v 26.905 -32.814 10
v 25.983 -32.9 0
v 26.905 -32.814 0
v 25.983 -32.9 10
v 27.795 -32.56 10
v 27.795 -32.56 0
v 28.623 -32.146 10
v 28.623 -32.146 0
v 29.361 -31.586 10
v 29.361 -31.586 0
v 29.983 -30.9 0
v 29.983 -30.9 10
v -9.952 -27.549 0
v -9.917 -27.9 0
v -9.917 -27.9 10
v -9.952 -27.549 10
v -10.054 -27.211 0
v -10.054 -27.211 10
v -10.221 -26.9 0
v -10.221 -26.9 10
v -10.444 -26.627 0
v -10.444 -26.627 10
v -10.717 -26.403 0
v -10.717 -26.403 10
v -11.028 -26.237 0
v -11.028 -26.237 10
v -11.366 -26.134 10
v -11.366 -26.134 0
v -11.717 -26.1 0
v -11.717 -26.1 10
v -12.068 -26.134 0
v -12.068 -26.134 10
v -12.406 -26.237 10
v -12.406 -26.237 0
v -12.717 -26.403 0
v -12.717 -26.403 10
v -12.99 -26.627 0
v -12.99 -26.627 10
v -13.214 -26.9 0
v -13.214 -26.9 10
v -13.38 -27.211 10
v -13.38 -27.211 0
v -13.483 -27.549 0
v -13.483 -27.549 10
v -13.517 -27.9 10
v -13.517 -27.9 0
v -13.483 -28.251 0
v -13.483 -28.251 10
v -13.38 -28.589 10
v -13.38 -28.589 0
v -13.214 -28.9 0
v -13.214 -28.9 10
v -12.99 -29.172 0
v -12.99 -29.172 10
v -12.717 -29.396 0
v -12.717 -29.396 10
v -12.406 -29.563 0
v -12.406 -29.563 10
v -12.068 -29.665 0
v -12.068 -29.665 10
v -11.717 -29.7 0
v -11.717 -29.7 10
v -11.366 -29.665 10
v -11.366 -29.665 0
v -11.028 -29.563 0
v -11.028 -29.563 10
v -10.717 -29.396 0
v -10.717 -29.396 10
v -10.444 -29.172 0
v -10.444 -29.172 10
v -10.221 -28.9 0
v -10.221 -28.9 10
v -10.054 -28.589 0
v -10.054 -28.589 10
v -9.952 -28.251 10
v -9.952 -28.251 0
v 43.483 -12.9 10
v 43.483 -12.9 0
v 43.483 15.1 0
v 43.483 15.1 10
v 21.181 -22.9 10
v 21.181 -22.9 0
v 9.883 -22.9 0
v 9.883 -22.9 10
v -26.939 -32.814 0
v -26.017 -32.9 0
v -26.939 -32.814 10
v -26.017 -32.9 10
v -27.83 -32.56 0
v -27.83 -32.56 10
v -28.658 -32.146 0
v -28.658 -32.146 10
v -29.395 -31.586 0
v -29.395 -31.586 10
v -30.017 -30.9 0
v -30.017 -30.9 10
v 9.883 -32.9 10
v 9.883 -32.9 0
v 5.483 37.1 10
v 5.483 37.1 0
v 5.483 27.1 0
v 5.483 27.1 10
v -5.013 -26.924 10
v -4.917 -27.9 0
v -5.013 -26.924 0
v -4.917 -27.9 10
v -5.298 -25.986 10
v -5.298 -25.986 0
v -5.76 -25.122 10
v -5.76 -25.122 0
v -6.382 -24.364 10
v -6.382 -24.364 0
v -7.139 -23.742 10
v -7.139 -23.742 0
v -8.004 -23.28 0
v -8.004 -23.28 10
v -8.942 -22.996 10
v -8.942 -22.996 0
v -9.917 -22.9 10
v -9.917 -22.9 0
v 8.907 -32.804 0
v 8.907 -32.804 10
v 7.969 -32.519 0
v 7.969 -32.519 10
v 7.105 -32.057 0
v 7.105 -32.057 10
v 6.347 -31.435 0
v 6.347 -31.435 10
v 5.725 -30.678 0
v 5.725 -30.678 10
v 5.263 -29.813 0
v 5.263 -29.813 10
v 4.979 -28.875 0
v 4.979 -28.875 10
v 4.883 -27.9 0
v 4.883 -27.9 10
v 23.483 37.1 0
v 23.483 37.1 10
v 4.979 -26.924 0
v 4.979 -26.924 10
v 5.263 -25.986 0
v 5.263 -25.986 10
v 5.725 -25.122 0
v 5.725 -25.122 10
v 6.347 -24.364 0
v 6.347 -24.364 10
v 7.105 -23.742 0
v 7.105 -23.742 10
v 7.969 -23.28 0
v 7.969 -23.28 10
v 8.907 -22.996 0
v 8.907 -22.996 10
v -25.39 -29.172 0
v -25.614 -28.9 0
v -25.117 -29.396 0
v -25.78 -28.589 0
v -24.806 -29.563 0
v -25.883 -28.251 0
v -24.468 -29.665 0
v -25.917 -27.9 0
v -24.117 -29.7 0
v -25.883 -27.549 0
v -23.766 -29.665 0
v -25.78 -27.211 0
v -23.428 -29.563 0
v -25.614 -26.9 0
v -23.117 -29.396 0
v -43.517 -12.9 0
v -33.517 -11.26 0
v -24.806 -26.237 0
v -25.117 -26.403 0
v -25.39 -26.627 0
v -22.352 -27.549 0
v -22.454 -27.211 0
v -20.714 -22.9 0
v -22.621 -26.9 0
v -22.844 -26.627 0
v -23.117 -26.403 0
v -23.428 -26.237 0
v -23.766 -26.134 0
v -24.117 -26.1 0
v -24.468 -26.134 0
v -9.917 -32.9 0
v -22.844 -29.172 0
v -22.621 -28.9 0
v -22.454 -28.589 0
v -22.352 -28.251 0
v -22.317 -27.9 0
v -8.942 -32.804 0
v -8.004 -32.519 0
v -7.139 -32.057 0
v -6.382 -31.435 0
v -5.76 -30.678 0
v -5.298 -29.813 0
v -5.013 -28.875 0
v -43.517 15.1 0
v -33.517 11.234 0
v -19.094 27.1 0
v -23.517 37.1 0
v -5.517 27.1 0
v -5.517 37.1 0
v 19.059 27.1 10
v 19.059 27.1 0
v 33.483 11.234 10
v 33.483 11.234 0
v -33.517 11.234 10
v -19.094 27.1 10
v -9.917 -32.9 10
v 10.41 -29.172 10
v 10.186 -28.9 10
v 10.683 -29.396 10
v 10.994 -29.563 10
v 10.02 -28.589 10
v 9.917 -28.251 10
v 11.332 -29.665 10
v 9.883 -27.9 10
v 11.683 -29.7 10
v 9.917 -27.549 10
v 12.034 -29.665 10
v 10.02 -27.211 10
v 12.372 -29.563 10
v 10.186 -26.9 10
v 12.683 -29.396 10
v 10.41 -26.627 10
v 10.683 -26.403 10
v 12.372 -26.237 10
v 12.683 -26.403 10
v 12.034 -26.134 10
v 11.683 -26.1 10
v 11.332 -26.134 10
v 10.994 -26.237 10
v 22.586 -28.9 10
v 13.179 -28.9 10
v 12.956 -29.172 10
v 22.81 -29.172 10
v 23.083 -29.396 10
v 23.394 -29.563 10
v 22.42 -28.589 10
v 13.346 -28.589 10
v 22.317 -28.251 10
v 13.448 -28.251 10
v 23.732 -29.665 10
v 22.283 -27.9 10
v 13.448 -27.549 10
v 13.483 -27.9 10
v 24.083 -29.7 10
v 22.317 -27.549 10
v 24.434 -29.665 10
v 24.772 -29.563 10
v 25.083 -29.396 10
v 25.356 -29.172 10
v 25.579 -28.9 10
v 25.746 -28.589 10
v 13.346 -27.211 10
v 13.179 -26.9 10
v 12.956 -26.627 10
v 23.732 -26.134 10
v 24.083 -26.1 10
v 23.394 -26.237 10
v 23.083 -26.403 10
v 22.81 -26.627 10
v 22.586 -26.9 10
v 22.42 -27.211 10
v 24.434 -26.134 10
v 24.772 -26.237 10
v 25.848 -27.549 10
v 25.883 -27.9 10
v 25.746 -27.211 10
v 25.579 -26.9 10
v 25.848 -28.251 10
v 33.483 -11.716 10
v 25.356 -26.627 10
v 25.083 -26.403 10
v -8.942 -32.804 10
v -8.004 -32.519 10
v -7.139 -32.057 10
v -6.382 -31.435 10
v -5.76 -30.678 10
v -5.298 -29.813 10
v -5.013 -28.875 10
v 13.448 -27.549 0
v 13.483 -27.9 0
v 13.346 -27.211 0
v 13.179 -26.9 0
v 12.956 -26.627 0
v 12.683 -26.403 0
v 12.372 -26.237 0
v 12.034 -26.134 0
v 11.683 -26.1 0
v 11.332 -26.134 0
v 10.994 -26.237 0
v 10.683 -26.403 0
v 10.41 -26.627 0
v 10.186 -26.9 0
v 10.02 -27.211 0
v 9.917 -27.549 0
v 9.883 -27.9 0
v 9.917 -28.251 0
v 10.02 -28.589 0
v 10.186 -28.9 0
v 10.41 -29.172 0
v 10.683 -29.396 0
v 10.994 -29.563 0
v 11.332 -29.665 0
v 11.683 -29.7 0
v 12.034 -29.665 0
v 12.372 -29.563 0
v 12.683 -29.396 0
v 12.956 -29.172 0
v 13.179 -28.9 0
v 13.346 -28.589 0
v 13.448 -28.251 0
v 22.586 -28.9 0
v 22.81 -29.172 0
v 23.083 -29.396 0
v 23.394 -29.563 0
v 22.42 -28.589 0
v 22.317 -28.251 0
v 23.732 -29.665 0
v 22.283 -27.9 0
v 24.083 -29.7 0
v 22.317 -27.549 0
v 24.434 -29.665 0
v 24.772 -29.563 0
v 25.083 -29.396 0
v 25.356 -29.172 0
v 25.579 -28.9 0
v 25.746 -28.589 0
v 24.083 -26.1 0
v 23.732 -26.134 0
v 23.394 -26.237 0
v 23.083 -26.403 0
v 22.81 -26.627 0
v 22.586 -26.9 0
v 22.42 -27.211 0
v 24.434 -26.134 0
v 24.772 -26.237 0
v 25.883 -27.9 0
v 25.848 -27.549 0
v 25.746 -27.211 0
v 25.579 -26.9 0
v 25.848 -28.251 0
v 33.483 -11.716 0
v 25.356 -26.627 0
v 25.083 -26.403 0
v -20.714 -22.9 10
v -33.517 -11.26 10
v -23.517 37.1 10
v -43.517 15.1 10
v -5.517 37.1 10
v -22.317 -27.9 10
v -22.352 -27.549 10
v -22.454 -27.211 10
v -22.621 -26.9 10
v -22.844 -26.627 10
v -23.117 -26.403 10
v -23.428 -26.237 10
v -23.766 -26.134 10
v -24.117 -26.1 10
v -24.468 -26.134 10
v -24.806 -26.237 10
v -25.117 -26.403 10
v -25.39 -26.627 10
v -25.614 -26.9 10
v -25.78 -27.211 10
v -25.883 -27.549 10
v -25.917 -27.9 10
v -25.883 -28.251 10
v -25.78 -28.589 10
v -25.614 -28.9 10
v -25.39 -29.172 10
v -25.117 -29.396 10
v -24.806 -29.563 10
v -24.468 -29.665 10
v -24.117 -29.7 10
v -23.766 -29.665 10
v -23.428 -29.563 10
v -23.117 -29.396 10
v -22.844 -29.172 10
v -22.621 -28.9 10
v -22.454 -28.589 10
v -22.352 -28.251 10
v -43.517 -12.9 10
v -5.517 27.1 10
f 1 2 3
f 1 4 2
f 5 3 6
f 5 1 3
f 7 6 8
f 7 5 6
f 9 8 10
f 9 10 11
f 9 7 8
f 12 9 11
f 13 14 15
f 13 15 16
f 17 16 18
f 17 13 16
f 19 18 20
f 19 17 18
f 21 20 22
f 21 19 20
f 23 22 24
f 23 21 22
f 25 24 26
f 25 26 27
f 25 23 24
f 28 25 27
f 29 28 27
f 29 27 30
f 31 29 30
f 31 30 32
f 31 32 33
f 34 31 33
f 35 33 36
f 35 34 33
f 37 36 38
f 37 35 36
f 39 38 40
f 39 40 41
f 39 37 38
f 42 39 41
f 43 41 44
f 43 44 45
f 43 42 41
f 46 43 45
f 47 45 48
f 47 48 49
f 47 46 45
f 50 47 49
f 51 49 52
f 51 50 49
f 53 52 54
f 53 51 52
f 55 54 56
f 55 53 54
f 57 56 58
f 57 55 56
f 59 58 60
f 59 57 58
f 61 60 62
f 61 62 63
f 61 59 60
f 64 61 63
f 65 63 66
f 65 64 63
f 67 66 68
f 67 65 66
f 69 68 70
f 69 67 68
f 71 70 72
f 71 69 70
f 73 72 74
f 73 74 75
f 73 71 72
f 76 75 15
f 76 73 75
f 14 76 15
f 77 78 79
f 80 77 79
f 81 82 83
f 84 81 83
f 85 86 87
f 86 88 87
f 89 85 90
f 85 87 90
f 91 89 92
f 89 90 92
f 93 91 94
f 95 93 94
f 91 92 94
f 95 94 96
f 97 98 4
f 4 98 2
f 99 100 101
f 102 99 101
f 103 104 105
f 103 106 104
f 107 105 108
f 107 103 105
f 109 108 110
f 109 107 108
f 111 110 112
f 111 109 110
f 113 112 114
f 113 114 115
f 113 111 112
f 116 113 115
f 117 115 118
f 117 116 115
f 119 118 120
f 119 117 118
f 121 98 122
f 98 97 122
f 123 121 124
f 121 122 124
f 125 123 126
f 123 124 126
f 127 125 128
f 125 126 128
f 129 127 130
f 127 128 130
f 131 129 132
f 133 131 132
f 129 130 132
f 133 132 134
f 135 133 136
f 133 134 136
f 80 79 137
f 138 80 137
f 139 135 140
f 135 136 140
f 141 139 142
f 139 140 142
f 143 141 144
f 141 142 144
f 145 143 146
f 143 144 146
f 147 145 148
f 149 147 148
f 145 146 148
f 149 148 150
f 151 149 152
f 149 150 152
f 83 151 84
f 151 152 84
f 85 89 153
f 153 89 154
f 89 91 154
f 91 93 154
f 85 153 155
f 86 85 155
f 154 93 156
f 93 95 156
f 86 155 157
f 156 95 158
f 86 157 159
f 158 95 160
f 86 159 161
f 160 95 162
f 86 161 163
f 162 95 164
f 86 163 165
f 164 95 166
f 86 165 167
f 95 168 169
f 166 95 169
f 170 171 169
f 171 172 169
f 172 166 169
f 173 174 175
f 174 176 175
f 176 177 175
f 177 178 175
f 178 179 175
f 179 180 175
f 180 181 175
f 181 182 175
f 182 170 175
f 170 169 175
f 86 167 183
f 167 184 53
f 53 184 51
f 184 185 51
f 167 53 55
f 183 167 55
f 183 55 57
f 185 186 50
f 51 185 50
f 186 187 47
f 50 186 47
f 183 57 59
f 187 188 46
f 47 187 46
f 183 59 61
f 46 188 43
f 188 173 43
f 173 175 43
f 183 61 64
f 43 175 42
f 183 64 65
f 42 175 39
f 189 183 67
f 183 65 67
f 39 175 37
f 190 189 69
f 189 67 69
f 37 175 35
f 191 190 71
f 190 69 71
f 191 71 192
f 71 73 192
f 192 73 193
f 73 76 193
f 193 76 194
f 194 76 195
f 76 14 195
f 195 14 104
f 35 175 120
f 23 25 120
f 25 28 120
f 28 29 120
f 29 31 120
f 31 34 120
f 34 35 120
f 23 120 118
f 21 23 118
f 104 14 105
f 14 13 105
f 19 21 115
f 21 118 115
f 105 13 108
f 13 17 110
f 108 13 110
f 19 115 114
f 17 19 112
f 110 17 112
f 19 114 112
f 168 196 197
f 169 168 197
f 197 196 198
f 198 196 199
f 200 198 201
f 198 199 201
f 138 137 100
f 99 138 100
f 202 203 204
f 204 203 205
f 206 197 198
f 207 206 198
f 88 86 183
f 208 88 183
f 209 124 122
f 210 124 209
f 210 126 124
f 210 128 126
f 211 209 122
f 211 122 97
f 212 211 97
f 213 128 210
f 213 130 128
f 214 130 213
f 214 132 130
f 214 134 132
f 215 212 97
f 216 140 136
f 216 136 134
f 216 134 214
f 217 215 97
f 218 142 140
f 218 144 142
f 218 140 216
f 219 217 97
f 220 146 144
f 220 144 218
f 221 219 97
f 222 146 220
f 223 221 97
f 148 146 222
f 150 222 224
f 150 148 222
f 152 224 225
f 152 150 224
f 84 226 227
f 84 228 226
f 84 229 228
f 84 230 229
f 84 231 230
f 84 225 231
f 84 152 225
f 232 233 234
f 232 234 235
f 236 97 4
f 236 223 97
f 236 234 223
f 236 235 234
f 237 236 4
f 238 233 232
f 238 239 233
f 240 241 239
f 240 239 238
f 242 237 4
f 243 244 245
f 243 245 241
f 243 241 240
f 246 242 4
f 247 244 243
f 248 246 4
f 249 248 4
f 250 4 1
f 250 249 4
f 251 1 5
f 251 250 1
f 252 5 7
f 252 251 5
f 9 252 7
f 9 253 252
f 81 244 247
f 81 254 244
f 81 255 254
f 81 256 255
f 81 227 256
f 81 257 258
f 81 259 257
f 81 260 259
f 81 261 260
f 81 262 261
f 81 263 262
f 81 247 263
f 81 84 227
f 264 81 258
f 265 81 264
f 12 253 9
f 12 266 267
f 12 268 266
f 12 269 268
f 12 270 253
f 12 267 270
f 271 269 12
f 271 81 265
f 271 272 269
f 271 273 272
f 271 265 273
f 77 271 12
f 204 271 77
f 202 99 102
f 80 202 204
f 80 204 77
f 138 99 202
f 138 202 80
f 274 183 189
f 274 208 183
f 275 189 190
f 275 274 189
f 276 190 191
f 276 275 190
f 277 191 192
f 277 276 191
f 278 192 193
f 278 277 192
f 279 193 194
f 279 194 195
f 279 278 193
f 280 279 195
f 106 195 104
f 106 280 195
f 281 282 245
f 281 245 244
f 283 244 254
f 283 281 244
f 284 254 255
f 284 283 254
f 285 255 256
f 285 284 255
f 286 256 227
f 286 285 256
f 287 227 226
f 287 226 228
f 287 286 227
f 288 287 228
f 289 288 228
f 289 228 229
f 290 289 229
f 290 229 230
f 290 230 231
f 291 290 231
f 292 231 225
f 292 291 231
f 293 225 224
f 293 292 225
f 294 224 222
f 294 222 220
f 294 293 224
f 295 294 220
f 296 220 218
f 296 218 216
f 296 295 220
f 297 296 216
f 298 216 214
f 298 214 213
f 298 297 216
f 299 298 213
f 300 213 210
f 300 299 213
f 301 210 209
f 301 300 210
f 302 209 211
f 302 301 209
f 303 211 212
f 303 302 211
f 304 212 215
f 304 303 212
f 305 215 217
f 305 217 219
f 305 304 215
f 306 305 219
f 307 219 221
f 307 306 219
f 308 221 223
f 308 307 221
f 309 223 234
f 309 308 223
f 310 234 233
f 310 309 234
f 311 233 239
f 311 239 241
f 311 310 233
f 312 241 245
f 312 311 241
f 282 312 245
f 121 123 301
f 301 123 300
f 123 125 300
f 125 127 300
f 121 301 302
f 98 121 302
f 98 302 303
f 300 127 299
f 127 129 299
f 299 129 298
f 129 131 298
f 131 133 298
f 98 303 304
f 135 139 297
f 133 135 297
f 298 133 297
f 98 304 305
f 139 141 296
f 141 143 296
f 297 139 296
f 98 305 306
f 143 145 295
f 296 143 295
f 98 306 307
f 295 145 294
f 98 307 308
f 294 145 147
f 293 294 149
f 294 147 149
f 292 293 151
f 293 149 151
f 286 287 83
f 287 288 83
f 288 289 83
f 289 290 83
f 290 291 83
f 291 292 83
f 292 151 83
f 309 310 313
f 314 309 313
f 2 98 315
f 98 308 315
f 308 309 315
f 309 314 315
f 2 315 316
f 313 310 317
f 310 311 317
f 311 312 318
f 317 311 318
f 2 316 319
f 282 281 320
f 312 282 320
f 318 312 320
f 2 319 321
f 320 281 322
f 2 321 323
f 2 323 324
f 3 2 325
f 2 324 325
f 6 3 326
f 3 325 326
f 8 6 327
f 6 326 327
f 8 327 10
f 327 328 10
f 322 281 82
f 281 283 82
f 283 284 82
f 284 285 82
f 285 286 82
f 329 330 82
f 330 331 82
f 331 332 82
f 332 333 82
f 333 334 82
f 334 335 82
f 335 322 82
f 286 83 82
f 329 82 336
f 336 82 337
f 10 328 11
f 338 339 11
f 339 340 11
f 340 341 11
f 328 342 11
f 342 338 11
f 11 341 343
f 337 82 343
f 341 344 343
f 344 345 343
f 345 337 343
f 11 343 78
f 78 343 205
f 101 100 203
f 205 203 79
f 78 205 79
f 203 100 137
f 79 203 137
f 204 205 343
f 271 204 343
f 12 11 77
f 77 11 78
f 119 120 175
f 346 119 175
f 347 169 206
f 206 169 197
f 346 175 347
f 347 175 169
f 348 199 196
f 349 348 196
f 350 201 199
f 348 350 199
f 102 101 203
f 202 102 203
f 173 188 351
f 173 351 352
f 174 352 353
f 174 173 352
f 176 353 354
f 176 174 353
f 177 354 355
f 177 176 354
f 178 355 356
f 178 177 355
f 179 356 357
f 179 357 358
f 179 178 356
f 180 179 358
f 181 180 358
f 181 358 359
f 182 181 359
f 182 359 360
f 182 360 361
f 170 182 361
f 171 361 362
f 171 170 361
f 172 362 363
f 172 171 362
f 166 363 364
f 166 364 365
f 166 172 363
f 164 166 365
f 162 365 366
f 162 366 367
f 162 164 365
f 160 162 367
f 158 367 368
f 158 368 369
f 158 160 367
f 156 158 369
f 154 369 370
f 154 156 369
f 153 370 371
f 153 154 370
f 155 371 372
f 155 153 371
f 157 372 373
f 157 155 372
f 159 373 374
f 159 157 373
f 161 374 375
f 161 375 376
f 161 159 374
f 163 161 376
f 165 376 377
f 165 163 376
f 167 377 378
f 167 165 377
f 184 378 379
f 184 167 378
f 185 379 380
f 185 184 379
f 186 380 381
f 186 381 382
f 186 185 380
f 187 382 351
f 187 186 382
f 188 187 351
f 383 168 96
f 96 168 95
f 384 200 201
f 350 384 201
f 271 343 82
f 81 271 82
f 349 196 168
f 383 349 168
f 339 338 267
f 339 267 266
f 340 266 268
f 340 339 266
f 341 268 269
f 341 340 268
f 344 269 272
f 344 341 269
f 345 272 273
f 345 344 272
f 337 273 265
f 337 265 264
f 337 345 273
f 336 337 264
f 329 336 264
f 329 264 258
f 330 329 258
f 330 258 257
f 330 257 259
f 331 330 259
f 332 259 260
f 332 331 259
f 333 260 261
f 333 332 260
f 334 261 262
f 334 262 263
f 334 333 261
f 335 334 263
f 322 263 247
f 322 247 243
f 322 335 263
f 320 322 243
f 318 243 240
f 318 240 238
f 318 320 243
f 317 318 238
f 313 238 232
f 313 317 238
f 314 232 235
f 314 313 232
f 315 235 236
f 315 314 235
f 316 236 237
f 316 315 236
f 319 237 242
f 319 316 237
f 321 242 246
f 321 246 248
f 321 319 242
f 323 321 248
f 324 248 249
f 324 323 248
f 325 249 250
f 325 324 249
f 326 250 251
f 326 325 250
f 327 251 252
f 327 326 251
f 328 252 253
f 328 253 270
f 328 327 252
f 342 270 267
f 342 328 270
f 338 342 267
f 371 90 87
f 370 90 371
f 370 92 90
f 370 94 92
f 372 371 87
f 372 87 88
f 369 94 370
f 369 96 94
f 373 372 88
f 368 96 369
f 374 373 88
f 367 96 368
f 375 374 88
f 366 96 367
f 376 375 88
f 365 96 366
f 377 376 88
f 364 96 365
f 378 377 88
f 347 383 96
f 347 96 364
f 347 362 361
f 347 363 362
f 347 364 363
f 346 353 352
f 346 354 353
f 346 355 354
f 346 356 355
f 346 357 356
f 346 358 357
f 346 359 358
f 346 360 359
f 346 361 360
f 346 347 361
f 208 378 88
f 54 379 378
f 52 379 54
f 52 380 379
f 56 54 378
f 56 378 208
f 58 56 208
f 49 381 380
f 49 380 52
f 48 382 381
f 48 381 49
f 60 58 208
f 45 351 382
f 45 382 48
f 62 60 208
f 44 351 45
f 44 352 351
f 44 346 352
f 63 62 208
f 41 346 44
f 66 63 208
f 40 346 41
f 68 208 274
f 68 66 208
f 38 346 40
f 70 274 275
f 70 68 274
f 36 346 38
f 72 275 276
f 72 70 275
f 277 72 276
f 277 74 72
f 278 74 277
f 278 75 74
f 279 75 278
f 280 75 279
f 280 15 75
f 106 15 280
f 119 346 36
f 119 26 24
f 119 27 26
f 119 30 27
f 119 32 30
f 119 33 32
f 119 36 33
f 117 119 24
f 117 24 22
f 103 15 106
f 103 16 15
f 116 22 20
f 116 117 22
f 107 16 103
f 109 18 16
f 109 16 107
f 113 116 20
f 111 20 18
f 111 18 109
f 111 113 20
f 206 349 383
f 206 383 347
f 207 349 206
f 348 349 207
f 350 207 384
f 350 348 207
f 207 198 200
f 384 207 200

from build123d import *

# Parameters (mm, degrees)
F0_R     = 1.8
F1_DEPTH = 10
F2_R     = 4.99999
F2_2_R   = 4.99999
F3_R     = 5
F3_2_R   = 5


# Not quite as in the source:
# - a fillet or chamfer is up to 0.001 mm smaller than in the source, because OpenCascade refuses the exact size


with BuildPart() as f1:
    # F0 (on Top) → F1 (new body)
    with BuildSketch(Plane.XY):
        Polygon((4.8827224633, -32.8996852207), (28.4827224633, -32.8996852207), (43.4827224633, -12.8996852207), (43.4827224633, 15.1003147793), (23.4827224633, 37.1003147793), (5.4827224633, 37.1003147793), (5.4827224633, 27.1003147793), (19.0590236021, 27.1003147793), (33.4827224633, 11.234246032), (33.4827224633, -11.7159301209), (21.1805918535, -22.8996852207), (4.8827224633, -22.8996852207), align=None)
        with Locations((11.6827224633, -27.8996852207)):
            Circle(F0_R, mode=Mode.SUBTRACT)
        with Locations((24.0827224633, -27.8996852207)):
            Circle(F0_R, mode=Mode.SUBTRACT)
    extrude(amount=F1_DEPTH)

    # F2#2 (radius 5 in the source; OpenCascade refuses exactly that, so slightly less here)
    f2_2_edges = [f1.edges().sort_by_distance(p)[0] for p in [
        (4.882722, -22.899685, 5),
        (4.882722, -32.899685, 5),
    ]]
    fillet(f2_2_edges, radius=F2_2_R)

    # F3#2
    f3_2_edges = [f1.edges().sort_by_distance(p)[0] for p in [
        (28.482722, -32.899685, 5),
    ]]
    fillet(f3_2_edges, radius=F3_2_R)


with BuildPart() as f1b:
    # F0 (on Top) → F1, piece 2 (new body)
    with BuildSketch(Plane.XY):
        Polygon((-43.5172775367, 15.1003147793), (-43.5172775367, -12.8996852207), (-28.5172775367, -32.8996852207), (-4.9172775367, -32.8996852207), (-4.9172775367, -22.8996852207), (-20.7140983621, -22.8996852207), (-33.5172775367, -11.2604314256), (-33.5172775367, 11.234246032), (-19.0935786755, 27.1003147793), (-5.5172775367, 27.1003147793), (-5.5172775367, 37.1003147793), (-23.5172775367, 37.1003147793), align=None)
        with Locations((-24.1172775367, -27.8996852207)):
            Circle(F0_R, mode=Mode.SUBTRACT)
        with Locations((-11.7172775367, -27.8996852207)):
            Circle(F0_R, mode=Mode.SUBTRACT)
    extrude(amount=F1_DEPTH)

    # F2 (radius 5 in the source; OpenCascade refuses exactly that, so slightly less here)
    f2_edges = [f1b.edges().sort_by_distance(p)[0] for p in [
        (-4.917278, -32.899685, 5),
        (-4.917278, -22.899685, 5),
    ]]
    fillet(f2_edges, radius=F2_R)

    # F3
    f3_edges = [f1b.edges().sort_by_distance(p)[0] for p in [
        (-28.517278, -32.899685, 5),
    ]]
    fillet(f3_edges, radius=F3_R)


solid = Compound([f1.part, f1b.part])
